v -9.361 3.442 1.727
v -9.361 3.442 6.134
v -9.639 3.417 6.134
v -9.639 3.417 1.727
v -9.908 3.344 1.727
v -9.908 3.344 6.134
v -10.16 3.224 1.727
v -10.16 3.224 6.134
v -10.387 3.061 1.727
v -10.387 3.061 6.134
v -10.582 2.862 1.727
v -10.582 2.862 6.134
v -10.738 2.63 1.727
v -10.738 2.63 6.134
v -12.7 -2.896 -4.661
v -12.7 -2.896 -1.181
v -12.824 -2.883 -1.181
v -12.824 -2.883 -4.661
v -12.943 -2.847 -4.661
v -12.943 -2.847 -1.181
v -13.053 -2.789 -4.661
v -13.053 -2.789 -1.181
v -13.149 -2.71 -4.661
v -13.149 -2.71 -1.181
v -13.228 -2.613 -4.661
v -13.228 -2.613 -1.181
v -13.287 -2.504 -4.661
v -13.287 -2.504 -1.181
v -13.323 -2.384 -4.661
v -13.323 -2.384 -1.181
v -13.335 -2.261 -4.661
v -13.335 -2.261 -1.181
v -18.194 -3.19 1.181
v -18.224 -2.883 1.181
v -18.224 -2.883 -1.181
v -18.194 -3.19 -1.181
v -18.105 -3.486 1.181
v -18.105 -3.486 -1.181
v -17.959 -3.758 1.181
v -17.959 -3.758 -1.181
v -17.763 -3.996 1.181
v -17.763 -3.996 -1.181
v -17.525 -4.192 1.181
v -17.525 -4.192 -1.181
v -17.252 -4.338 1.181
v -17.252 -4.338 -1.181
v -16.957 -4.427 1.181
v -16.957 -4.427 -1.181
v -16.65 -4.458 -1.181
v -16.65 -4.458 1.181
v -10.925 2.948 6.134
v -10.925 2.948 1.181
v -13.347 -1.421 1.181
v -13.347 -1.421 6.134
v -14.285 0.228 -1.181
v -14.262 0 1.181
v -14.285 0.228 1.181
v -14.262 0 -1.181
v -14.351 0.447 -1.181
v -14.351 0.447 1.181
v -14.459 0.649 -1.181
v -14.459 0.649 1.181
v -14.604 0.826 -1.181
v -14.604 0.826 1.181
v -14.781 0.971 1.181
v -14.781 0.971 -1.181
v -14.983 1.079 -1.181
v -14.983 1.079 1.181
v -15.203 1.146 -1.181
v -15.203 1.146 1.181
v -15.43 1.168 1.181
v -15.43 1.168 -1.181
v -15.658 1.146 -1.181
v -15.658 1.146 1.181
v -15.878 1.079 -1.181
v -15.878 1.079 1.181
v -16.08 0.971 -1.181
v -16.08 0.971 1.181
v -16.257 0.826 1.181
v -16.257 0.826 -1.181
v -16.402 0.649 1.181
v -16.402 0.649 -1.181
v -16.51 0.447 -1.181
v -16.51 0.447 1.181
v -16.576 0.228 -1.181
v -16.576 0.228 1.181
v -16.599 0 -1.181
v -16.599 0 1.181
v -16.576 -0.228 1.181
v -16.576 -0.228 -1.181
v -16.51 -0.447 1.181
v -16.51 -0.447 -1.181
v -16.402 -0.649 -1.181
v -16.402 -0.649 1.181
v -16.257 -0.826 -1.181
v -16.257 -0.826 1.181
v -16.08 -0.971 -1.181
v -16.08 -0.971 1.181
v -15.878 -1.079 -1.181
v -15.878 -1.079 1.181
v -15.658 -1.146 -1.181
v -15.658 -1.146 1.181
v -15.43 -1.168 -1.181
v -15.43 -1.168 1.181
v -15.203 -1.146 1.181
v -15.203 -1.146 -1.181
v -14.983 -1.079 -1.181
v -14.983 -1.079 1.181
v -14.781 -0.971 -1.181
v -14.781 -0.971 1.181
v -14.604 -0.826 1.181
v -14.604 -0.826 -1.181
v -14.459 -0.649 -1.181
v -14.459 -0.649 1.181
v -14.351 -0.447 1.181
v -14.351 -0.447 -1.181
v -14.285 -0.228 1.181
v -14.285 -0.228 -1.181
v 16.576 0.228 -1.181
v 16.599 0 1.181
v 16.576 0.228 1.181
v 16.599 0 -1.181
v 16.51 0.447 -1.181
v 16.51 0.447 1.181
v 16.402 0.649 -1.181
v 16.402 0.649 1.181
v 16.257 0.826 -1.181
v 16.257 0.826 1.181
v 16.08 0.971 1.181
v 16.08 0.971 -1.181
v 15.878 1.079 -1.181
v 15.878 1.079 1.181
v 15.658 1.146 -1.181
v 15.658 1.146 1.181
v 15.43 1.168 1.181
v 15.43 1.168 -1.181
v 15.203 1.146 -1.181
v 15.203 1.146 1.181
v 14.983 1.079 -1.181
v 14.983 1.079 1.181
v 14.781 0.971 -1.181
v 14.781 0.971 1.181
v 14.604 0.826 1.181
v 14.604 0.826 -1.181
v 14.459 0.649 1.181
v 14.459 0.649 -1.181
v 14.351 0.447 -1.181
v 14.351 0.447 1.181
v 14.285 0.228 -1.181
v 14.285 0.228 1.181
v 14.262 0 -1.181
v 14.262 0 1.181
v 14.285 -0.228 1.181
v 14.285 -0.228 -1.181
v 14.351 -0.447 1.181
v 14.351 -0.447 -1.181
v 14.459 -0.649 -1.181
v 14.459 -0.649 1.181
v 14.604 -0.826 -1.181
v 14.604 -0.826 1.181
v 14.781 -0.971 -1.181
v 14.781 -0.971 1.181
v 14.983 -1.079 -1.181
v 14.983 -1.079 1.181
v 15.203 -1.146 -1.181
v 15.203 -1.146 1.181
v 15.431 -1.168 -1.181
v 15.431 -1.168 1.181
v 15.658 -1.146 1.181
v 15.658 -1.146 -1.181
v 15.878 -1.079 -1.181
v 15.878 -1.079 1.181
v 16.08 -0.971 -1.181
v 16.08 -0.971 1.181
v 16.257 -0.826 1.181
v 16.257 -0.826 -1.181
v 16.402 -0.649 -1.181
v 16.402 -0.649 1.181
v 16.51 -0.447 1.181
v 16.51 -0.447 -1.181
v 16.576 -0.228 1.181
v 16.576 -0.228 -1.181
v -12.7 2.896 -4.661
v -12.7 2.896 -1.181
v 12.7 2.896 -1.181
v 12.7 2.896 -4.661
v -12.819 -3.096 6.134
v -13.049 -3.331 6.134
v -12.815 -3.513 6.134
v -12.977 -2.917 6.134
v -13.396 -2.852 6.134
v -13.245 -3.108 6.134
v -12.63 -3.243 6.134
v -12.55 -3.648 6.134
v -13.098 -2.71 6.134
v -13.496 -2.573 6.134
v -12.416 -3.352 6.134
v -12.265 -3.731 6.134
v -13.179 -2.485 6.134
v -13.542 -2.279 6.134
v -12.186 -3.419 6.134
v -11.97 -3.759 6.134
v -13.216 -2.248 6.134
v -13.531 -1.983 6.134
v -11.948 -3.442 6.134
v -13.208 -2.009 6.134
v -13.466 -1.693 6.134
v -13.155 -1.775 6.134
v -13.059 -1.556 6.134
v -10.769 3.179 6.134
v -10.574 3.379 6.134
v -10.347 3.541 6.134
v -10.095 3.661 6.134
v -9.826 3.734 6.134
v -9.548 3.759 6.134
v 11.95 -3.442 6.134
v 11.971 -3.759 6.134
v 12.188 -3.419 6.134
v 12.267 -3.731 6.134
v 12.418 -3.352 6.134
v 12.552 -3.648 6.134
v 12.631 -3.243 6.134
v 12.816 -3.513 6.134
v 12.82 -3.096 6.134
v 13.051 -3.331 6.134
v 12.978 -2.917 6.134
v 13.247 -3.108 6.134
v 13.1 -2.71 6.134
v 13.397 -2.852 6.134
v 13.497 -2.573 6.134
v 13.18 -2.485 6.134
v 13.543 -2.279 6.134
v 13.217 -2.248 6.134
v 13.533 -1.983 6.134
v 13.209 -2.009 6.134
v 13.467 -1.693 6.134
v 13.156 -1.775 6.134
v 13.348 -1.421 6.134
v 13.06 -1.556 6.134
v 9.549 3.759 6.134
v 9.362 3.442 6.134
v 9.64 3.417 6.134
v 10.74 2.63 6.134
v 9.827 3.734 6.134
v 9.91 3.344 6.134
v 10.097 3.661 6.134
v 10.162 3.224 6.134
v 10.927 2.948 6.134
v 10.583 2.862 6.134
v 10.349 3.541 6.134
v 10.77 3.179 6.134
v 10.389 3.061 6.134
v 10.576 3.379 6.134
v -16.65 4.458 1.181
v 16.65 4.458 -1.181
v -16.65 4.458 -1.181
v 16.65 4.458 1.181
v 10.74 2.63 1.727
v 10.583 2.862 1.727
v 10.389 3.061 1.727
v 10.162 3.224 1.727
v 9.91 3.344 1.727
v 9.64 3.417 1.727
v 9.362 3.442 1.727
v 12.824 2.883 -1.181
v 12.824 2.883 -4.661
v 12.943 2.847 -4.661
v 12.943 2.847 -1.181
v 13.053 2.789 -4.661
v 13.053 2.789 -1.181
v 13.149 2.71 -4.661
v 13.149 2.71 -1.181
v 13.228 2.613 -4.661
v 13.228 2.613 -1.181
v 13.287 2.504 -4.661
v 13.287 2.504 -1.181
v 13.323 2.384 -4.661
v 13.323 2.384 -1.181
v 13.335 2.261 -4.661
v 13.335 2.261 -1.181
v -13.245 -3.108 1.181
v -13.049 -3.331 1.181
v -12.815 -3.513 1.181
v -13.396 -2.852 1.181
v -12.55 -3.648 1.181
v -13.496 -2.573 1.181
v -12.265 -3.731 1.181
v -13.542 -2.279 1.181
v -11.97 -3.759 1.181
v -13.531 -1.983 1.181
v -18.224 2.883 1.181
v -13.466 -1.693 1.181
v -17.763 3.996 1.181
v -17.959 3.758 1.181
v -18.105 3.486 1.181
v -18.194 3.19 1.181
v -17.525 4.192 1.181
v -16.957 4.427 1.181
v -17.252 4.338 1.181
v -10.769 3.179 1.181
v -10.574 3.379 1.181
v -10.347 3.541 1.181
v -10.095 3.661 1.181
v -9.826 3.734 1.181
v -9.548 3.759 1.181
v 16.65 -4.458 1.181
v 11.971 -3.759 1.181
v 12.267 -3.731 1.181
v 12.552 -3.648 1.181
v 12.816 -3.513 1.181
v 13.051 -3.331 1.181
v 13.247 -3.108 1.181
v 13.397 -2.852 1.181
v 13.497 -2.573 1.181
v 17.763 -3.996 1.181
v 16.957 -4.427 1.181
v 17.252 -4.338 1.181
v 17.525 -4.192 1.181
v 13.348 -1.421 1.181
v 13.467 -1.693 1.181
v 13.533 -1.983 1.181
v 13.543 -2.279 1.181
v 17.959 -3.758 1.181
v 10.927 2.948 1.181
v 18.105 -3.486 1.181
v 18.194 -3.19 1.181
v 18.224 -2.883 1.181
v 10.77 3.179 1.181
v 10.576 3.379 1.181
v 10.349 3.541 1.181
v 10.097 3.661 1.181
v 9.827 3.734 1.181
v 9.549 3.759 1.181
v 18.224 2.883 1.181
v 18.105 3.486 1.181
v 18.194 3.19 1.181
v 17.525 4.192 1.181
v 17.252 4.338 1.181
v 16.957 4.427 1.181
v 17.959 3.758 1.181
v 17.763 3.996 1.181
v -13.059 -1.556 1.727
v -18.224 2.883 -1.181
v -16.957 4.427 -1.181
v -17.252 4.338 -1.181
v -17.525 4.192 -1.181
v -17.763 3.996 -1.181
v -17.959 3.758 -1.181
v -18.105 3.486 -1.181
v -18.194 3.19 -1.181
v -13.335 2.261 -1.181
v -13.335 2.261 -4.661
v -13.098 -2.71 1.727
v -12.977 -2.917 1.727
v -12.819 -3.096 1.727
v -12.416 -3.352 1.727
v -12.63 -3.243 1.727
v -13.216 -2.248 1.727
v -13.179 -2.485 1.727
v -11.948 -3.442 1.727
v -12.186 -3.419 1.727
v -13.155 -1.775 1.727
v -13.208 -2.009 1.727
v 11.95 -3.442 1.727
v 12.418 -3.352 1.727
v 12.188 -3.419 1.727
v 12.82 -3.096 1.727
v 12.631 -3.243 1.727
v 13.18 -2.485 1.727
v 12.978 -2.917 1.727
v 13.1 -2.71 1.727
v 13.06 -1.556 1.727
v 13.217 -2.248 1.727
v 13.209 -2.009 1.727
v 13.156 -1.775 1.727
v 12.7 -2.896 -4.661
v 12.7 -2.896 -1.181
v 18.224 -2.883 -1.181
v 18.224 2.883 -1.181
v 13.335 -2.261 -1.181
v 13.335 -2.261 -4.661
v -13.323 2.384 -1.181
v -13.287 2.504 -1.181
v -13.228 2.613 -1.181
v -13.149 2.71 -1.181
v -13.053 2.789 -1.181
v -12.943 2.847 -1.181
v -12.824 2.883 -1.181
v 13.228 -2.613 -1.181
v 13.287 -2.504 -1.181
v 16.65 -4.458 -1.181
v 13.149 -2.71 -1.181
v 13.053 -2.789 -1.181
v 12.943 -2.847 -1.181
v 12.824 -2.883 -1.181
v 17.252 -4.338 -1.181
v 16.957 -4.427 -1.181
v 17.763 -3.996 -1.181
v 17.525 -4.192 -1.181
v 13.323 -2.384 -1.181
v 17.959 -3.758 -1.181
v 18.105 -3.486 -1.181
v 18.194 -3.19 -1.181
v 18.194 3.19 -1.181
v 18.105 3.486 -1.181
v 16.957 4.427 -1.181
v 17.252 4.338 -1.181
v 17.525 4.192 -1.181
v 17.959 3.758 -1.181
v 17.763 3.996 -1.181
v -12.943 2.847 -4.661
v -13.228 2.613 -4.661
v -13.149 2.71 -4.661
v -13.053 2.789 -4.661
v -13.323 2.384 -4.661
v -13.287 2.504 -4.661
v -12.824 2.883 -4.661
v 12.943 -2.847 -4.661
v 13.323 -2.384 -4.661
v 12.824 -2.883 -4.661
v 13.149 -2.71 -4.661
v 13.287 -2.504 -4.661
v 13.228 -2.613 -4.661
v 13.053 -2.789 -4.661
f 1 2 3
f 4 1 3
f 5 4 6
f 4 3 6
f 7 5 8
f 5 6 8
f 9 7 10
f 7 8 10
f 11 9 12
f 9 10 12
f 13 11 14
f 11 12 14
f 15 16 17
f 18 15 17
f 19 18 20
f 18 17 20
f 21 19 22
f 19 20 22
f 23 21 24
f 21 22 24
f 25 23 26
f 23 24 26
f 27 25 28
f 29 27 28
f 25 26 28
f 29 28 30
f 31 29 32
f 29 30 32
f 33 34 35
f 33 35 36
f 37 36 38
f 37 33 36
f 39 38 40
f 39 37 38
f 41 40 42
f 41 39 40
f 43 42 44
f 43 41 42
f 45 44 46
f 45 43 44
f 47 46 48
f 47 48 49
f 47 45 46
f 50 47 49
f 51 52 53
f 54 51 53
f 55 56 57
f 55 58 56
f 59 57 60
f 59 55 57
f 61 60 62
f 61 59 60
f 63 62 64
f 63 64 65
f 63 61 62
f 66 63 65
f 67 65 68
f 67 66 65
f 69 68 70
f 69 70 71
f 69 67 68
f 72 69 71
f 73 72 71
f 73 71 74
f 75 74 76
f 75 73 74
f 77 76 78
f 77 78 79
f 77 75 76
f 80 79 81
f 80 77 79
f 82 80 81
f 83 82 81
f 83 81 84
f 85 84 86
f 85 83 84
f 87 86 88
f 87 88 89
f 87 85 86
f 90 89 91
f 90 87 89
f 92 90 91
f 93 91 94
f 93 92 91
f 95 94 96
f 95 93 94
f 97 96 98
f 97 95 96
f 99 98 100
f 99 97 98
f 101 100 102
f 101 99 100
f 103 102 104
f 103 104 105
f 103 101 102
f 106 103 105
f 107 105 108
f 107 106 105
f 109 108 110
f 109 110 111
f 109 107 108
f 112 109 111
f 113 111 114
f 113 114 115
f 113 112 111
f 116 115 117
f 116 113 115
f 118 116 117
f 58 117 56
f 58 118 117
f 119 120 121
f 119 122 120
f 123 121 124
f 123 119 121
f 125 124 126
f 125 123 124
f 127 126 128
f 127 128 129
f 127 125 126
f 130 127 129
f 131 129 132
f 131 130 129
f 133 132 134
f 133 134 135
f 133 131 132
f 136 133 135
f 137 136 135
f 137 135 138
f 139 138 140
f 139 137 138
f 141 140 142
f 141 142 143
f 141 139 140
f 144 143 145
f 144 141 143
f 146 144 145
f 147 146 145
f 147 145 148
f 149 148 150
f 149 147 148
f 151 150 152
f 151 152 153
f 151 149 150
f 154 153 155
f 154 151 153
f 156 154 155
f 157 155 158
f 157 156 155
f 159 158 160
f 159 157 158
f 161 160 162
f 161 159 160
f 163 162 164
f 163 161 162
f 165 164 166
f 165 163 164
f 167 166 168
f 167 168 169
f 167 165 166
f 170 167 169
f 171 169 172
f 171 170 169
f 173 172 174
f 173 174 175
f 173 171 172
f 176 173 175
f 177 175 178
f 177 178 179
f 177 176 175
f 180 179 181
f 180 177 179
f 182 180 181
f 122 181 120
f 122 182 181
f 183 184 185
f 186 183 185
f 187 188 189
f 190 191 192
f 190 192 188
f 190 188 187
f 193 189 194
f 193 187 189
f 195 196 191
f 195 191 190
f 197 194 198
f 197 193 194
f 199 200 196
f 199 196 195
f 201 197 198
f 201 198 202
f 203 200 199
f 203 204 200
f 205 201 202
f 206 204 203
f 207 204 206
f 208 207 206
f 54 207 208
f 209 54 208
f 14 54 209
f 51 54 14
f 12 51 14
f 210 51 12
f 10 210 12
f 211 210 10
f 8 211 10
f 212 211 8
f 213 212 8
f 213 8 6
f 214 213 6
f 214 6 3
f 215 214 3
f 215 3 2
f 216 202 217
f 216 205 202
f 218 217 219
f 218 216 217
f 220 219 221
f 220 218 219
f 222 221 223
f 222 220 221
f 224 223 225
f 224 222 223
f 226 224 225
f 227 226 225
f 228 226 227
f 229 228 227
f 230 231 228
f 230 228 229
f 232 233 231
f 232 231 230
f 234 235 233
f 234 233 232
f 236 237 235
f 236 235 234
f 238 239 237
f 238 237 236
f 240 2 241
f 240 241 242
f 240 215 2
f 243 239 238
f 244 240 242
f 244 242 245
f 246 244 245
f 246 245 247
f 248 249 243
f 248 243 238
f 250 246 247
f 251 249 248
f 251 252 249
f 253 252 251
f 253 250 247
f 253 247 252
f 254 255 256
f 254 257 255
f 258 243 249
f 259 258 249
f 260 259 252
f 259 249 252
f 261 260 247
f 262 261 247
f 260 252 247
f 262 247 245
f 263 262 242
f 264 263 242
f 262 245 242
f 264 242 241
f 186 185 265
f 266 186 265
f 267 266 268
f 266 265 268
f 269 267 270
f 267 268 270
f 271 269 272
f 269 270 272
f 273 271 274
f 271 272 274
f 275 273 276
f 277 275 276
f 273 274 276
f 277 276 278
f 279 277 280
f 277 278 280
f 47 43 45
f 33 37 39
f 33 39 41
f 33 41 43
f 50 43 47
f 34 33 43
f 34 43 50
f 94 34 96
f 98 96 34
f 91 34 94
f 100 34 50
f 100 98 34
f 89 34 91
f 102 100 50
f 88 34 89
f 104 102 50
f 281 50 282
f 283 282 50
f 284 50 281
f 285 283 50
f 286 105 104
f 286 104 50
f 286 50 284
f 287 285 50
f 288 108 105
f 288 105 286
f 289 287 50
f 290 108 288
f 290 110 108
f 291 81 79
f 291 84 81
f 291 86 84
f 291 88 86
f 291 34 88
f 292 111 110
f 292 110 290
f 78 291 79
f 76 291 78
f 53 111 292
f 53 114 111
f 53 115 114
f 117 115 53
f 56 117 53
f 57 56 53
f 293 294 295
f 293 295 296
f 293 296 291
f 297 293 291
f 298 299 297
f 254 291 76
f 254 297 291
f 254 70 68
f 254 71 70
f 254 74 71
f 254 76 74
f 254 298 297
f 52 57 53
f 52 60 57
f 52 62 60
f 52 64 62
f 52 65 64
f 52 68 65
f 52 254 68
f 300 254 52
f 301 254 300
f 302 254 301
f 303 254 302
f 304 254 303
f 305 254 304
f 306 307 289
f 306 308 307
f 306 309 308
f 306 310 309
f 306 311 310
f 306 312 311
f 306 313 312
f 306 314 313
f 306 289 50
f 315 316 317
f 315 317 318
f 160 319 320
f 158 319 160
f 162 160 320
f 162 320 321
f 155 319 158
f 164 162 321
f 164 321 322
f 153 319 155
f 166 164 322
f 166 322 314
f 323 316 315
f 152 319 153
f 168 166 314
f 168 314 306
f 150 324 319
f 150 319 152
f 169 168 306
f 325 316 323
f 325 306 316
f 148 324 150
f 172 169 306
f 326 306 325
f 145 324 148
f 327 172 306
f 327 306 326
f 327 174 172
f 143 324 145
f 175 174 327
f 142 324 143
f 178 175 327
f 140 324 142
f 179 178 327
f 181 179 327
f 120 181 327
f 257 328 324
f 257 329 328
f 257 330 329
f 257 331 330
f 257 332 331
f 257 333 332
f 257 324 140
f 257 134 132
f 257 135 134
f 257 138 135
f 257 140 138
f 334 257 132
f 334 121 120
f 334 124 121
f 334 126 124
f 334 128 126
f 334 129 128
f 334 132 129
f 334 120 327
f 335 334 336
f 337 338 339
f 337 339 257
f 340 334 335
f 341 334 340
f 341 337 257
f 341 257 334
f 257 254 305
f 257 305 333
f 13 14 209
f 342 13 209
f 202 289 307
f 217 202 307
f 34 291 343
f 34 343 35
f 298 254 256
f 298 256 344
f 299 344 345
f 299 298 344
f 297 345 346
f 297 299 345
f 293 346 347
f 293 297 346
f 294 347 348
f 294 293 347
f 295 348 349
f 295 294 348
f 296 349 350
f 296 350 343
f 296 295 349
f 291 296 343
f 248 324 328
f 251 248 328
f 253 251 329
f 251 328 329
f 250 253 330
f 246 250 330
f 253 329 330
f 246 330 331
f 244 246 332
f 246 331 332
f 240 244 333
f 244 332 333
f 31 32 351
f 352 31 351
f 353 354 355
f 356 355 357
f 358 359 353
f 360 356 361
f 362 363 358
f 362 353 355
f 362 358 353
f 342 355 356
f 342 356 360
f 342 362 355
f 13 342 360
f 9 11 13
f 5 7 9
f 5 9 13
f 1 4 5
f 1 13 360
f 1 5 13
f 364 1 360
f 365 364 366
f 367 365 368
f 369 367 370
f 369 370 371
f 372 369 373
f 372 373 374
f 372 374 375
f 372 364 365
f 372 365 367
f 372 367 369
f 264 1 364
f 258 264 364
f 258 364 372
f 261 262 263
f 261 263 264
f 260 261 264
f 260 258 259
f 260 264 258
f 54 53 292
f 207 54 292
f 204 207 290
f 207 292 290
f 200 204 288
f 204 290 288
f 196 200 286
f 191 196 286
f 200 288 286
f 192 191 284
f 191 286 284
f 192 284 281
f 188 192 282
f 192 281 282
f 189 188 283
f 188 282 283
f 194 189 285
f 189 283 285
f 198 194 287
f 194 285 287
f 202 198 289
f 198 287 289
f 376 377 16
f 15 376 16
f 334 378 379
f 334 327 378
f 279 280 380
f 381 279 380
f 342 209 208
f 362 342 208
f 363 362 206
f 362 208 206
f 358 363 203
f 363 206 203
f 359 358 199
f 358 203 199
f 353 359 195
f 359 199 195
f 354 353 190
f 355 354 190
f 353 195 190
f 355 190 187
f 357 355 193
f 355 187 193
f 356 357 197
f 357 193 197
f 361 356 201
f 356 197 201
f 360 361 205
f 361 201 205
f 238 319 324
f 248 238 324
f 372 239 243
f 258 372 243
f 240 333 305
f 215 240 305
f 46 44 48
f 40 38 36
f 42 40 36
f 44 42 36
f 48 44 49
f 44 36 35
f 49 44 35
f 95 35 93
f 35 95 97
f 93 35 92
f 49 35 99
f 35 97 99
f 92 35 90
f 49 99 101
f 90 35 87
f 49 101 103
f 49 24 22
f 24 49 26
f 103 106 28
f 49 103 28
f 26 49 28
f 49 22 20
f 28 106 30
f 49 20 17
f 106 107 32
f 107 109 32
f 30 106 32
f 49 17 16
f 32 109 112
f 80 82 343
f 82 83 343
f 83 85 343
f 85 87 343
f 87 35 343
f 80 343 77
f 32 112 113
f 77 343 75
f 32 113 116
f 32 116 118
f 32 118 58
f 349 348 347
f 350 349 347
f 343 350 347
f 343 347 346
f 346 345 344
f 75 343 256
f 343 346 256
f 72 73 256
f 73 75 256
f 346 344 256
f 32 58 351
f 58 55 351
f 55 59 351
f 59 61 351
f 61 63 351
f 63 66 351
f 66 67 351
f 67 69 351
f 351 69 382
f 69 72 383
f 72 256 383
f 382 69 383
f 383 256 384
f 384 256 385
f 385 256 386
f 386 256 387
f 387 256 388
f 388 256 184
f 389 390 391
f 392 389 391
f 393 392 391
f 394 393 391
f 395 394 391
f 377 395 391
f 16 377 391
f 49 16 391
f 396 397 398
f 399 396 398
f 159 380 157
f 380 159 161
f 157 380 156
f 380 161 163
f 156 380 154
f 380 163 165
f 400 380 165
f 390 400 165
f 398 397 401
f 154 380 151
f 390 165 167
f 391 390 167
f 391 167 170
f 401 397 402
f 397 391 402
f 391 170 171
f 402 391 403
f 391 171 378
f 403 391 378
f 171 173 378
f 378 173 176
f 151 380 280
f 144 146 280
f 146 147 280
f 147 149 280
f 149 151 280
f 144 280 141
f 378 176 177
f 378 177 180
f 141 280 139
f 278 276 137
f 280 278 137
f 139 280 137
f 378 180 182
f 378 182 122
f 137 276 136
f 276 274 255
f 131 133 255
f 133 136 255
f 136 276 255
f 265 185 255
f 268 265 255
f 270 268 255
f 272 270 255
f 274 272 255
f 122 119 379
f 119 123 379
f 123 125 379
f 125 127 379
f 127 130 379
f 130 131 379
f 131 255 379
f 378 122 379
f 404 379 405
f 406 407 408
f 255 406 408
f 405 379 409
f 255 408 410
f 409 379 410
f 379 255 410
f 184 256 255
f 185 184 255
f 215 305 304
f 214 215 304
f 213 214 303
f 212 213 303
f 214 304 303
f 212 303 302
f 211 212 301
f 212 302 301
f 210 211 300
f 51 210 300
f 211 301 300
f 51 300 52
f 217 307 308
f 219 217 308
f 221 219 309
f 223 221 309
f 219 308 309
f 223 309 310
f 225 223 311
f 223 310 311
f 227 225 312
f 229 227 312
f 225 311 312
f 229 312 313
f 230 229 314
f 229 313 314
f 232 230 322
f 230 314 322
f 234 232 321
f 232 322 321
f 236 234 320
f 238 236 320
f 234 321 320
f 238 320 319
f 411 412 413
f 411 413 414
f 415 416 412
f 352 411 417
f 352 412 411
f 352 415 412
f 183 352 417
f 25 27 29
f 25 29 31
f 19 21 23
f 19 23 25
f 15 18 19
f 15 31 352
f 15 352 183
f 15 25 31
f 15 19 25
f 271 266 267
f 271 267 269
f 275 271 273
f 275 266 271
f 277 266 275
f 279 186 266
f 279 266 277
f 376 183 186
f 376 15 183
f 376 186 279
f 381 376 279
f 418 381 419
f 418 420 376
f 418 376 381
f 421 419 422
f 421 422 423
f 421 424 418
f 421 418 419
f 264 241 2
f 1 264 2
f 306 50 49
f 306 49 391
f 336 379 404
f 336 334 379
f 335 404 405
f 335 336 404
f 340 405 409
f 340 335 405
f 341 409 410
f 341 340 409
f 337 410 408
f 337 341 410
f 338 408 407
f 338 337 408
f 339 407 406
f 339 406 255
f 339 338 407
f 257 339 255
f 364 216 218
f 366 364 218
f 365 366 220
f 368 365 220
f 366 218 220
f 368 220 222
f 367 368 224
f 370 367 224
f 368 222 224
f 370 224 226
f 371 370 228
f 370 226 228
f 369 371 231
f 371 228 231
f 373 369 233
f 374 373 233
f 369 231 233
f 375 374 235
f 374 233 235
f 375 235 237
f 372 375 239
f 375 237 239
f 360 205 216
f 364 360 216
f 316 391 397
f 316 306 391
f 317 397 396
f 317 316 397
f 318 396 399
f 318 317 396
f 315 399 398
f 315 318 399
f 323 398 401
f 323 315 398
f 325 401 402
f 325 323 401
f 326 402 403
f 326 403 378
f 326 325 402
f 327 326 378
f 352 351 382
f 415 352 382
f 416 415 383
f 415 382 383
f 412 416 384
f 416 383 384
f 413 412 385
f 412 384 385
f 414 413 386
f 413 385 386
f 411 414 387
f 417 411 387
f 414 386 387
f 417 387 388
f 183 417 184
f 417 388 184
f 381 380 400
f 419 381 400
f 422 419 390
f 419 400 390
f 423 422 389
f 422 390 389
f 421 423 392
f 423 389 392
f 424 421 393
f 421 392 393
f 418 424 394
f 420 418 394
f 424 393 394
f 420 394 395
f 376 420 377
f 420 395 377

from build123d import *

# Parameters (mm, degrees)
F0_R     = 1.1684
F1_DEPTH = 1.1811
F3_DEPTH = 4.953
F5_DEPTH = 3.4798
F7_DEPTH = 4.4069


with BuildPart() as f1:
    # F0 (on Top) → F1 (new body, symmetric)
    with BuildSketch(Plane.XY):
        with BuildLine():
            Line((16.6497, 4.4577), (-16.6497, 4.4577))
            ThreePointArc((-16.6497, 4.4577), (-17.763252, 3.996452), (-18.2245, 2.8829))
            Line((-18.2245, 2.8829), (-18.2245, -2.8829))
            ThreePointArc((-18.2245, -2.8829), (-17.763252, -3.996452), (-16.6497, -4.4577))
            Line((-16.6497, -4.4577), (16.6497, -4.4577))
            ThreePointArc((16.6497, -4.4577), (17.763252, -3.996452), (18.2245, -2.8829))
            Line((18.2245, -2.8829), (18.2245, 2.8829))
            ThreePointArc((18.2245, 2.8829), (17.763252, 3.996452), (16.6497, 4.4577))
        make_face()
        with Locations((-15.4305, 0)):
            Circle(F0_R, mode=Mode.SUBTRACT)
        with Locations((15.4305, 0)):
            Circle(F0_R, mode=Mode.SUBTRACT)
    extrude(amount=F1_DEPTH, both=True)

    # F2 (on face) → F3 (join)
    with BuildSketch(Plane.XY.offset(1.1811)):
        with BuildLine():
            Line((-11.96962, -3.7592), (11.971078, -3.7592))
            ThreePointArc((11.971078, -3.7592), (13.327971, -2.983671), (13.348429, -1.420922))
            Line((13.348429, -1.420922), (10.926763, 2.947878))
            ThreePointArc((10.926763, 2.947878), (10.348684, 3.541294), (9.549412, 3.7592))
            Line((9.549412, 3.7592), (-9.547955, 3.7592))
            ThreePointArc((-9.547955, 3.7592), (-10.347226, 3.541294), (-10.925306, 2.947878))
            Line((-10.925306, 2.947878), (-13.346971, -1.420922))
            ThreePointArc((-13.346971, -1.420922), (-13.326514, -2.983671), (-11.96962, -3.7592))
        make_face()
    extrude(amount=F3_DEPTH)

    # F4 (on face) → F5 (join)
    with BuildSketch(Plane(origin=(0, 0, -1.1811), x_dir=(1, 0, 0), z_dir=(0, 0, -1))):
        with BuildLine():
            Line((12.7, 2.8956), (-12.7, 2.8956))
            ThreePointArc((-12.7, 2.8956), (-13.149013, 2.709613), (-13.335, 2.2606))
            Line((-13.335, 2.2606), (-13.335, -2.2606))
            ThreePointArc((-13.335, -2.2606), (-13.149013, -2.709613), (-12.7, -2.8956))
            Line((-12.7, -2.8956), (12.7, -2.8956))
            ThreePointArc((12.7, -2.8956), (13.149013, -2.709613), (13.335, -2.2606))
            Line((13.335, -2.2606), (13.335, 2.2606))
            ThreePointArc((13.335, 2.2606), (13.149013, 2.709613), (12.7, 2.8956))
        make_face()
    extrude(amount=F5_DEPTH)

    # F6 (on face) → F7 (cut)
    with BuildSketch(Plane.XY.offset(6.1341)):
        with BuildLine():
            Line((9.36239, 3.4417), (-9.360933, 3.4417))
            ThreePointArc((-9.360933, 3.4417), (-10.160204, 3.223794), (-10.738284, 2.630378))
            Line((-10.738284, 2.630378), (-13.058827, -1.555992))
            ThreePointArc((-13.058827, -1.555992), (-13.042329, -2.816274), (-11.94806, -3.4417))
            Line((-11.94806, -3.4417), (11.949517, -3.4417))
            ThreePointArc((11.949517, -3.4417), (13.043786, -2.816274), (13.060284, -1.555992))
            Line((13.060284, -1.555992), (10.739742, 2.630378))
            ThreePointArc((10.739742, 2.630378), (10.161662, 3.223794), (9.36239, 3.4417))
        make_face()
    extrude(amount=-F7_DEPTH, mode=Mode.SUBTRACT)


solid = f1.part
